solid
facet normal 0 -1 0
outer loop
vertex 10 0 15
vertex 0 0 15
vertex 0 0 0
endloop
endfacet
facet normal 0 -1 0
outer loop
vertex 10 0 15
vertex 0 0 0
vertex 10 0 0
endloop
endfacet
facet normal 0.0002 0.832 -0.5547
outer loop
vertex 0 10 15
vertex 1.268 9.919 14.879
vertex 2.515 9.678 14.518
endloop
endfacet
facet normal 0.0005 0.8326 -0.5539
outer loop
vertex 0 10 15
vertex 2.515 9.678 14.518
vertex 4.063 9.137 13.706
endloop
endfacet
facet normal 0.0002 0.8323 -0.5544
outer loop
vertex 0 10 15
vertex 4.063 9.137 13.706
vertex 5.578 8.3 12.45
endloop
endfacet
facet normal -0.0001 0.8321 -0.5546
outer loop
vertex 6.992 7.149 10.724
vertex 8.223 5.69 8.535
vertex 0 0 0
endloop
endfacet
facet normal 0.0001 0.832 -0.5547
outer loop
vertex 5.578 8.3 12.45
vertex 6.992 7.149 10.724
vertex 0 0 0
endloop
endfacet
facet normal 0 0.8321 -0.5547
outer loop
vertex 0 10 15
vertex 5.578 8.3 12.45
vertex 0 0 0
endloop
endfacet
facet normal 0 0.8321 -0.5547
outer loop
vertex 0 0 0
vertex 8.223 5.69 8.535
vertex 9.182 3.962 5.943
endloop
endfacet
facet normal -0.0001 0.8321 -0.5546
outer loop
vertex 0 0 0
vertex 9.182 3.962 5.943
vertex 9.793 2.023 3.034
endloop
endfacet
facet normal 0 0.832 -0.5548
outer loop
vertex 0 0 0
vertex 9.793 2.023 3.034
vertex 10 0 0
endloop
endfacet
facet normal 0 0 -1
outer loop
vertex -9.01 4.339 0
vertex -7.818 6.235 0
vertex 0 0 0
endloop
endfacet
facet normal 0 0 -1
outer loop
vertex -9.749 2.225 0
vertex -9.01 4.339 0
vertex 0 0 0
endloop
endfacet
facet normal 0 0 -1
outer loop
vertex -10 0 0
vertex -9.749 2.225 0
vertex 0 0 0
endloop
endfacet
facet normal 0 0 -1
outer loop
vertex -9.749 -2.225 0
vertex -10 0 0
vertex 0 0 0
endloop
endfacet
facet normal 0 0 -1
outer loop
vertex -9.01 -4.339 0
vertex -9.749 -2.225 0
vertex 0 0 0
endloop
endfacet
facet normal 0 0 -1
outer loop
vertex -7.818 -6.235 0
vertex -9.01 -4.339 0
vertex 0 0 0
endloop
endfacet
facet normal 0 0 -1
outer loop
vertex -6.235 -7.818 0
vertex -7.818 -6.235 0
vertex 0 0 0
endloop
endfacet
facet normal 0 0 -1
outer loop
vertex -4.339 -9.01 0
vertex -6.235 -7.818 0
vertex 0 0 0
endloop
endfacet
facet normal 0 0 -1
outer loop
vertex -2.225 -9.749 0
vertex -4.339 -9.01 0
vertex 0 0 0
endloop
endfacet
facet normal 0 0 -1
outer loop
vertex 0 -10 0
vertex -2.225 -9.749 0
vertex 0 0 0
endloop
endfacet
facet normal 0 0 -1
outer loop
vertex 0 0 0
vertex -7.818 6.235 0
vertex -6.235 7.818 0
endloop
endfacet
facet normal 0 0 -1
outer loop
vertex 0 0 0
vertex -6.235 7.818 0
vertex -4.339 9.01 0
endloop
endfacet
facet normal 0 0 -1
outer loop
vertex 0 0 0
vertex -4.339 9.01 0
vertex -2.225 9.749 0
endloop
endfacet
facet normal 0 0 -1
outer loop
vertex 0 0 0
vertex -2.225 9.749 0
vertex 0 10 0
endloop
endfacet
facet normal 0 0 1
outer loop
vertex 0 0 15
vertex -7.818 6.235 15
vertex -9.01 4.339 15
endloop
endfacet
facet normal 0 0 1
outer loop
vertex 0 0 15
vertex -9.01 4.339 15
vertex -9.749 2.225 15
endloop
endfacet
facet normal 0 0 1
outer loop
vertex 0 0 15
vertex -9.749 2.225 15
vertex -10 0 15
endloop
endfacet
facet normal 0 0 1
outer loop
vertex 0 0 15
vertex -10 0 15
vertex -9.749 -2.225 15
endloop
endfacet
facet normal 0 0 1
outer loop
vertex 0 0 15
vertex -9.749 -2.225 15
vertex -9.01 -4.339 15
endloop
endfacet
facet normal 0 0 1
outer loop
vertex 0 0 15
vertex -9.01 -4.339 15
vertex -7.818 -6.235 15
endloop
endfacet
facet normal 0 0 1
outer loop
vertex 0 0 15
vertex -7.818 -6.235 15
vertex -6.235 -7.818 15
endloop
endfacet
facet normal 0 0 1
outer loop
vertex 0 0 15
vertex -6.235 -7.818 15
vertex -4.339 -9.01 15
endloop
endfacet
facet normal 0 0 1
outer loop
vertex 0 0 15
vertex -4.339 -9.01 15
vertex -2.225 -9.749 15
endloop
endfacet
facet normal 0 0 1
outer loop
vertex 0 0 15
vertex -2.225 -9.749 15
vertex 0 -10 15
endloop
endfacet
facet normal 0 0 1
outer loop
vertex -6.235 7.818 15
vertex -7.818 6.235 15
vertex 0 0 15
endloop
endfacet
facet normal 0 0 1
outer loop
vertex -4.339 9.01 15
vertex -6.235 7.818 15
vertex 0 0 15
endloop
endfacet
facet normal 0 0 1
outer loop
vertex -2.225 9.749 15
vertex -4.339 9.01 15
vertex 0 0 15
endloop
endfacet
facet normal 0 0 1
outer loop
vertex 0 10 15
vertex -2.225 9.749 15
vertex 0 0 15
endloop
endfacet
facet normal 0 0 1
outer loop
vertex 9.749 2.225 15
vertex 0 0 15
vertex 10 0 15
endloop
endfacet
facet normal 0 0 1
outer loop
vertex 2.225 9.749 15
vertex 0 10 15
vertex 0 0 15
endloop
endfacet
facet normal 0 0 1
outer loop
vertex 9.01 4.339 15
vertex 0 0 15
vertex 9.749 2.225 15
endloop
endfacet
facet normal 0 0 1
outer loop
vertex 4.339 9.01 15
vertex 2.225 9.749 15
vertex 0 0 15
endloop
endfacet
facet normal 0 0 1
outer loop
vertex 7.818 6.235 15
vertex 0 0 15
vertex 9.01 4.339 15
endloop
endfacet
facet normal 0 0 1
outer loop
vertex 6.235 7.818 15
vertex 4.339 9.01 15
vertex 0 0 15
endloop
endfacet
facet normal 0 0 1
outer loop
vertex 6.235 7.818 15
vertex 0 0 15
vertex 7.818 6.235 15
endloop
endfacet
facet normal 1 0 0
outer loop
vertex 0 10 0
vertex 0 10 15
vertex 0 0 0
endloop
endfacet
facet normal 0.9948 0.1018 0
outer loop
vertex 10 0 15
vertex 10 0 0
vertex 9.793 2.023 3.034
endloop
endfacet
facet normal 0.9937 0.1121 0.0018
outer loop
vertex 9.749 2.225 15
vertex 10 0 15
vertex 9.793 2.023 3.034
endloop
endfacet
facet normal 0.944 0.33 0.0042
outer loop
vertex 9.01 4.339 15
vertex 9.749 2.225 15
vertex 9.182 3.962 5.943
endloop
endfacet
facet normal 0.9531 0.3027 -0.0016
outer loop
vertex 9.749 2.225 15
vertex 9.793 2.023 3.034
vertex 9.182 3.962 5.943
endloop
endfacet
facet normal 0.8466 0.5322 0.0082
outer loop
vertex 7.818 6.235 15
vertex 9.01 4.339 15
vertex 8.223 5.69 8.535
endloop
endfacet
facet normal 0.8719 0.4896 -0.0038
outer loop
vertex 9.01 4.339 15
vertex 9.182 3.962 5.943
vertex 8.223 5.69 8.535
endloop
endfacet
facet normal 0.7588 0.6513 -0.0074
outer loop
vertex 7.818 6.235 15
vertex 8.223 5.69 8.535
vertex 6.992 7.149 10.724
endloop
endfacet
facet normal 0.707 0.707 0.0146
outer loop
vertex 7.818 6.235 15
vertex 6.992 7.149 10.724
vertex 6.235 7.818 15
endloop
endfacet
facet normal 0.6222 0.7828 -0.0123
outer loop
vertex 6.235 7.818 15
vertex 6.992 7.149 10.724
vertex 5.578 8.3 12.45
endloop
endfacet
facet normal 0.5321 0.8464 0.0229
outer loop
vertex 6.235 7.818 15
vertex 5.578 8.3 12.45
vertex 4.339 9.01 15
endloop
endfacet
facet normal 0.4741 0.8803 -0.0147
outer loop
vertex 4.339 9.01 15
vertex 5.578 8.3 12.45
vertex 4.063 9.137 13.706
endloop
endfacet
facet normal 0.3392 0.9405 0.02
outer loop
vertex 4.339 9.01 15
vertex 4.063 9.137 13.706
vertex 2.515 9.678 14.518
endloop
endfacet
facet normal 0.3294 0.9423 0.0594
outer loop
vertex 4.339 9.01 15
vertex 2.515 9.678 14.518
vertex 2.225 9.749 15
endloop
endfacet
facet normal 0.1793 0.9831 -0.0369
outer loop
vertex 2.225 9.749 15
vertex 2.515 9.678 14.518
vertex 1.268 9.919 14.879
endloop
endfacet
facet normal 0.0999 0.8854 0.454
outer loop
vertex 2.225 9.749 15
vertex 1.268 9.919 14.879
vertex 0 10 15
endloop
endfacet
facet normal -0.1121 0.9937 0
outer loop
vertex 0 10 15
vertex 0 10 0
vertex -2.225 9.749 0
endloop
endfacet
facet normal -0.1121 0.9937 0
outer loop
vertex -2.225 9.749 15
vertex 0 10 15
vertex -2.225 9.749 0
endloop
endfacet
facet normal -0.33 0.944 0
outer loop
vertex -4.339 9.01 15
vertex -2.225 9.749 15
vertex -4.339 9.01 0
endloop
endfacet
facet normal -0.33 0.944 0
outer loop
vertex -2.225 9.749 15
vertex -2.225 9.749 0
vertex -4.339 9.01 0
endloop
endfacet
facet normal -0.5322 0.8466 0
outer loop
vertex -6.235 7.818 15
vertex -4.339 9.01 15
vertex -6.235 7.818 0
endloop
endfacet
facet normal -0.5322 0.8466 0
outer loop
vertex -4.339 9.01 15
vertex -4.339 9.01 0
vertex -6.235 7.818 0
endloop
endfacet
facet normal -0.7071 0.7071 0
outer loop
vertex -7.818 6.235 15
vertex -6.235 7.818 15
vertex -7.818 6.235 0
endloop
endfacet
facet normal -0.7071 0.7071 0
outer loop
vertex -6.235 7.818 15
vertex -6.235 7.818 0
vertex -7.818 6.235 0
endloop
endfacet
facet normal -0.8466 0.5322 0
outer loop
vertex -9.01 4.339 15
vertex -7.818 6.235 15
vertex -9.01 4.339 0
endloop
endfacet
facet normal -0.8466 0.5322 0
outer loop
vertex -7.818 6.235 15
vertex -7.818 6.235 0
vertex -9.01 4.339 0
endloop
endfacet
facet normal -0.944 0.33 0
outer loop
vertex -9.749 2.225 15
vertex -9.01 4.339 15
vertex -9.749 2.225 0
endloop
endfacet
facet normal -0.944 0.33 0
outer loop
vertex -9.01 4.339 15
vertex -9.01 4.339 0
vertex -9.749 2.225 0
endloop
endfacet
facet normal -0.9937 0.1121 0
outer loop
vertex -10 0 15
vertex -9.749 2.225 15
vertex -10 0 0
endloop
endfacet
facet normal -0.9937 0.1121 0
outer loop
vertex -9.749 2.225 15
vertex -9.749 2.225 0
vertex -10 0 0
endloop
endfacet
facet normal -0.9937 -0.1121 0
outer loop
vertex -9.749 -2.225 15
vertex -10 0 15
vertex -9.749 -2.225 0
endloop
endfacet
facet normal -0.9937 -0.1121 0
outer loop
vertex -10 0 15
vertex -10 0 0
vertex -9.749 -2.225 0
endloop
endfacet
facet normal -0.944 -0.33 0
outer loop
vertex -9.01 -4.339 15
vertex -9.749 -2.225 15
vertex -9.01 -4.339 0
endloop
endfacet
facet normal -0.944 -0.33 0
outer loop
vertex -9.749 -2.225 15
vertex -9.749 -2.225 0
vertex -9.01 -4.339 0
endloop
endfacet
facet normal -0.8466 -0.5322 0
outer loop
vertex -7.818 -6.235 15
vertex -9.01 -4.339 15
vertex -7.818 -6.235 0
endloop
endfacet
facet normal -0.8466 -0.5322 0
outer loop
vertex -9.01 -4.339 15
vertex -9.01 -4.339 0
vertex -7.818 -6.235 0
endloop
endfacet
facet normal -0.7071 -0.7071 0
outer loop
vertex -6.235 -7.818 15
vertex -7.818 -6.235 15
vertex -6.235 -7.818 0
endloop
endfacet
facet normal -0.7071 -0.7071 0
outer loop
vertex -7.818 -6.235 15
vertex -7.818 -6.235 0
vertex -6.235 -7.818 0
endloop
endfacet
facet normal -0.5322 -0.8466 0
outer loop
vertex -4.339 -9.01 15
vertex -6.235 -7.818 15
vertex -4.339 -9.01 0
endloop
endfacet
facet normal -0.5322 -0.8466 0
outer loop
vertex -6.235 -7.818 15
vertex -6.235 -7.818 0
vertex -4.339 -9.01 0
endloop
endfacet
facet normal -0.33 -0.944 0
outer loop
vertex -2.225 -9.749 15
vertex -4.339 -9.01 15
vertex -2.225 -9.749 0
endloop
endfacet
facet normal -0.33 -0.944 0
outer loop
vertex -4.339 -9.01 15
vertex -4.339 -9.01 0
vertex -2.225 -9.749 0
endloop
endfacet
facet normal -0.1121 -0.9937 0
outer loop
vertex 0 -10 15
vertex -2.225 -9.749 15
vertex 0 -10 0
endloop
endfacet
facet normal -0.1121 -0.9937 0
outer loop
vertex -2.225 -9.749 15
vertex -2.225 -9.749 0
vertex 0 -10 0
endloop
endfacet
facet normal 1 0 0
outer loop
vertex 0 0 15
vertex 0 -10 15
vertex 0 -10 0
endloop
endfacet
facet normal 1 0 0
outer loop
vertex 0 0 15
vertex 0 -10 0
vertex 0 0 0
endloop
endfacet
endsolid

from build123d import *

# Parameters (mm, degrees)
SKETCH1_R           = 10
BOSS_EXTRUDE1_DEPTH = 15
CUT_EXTRUDE1_DEPTH  = 16
CUT_EXTRUDE2_DEPTH  = 10


with BuildPart() as part:
    # Sketch1 → Boss-Extrude1 (new body)
    with BuildSketch(Plane.XY):
        Circle(SKETCH1_R)
    extrude(amount=BOSS_EXTRUDE1_DEPTH)

    # Sketch2 → Cut-Extrude1 (cut, through all)
    with BuildSketch(Plane.XY.offset(15)):
        with BuildLine():
            Line((0, 0), (10, 0))
            ThreePointArc((10, 0), (7.071067812, -7.071067812), (0, -10))
            Line((0, -10), (0, 0))
        make_face()
    extrude(amount=-CUT_EXTRUDE1_DEPTH, mode=Mode.SUBTRACT)

    # Sketch5 → Cut-Extrude2 (cut)
    with BuildSketch(Plane(origin=(10, 0, 0), x_dir=(0, 0, -1), z_dir=(1, 0, 0))):
        Polygon((0, 0), (0, 10), (-15, 10), align=None)
    extrude(amount=-CUT_EXTRUDE2_DEPTH, mode=Mode.SUBTRACT)


solid = part.part
